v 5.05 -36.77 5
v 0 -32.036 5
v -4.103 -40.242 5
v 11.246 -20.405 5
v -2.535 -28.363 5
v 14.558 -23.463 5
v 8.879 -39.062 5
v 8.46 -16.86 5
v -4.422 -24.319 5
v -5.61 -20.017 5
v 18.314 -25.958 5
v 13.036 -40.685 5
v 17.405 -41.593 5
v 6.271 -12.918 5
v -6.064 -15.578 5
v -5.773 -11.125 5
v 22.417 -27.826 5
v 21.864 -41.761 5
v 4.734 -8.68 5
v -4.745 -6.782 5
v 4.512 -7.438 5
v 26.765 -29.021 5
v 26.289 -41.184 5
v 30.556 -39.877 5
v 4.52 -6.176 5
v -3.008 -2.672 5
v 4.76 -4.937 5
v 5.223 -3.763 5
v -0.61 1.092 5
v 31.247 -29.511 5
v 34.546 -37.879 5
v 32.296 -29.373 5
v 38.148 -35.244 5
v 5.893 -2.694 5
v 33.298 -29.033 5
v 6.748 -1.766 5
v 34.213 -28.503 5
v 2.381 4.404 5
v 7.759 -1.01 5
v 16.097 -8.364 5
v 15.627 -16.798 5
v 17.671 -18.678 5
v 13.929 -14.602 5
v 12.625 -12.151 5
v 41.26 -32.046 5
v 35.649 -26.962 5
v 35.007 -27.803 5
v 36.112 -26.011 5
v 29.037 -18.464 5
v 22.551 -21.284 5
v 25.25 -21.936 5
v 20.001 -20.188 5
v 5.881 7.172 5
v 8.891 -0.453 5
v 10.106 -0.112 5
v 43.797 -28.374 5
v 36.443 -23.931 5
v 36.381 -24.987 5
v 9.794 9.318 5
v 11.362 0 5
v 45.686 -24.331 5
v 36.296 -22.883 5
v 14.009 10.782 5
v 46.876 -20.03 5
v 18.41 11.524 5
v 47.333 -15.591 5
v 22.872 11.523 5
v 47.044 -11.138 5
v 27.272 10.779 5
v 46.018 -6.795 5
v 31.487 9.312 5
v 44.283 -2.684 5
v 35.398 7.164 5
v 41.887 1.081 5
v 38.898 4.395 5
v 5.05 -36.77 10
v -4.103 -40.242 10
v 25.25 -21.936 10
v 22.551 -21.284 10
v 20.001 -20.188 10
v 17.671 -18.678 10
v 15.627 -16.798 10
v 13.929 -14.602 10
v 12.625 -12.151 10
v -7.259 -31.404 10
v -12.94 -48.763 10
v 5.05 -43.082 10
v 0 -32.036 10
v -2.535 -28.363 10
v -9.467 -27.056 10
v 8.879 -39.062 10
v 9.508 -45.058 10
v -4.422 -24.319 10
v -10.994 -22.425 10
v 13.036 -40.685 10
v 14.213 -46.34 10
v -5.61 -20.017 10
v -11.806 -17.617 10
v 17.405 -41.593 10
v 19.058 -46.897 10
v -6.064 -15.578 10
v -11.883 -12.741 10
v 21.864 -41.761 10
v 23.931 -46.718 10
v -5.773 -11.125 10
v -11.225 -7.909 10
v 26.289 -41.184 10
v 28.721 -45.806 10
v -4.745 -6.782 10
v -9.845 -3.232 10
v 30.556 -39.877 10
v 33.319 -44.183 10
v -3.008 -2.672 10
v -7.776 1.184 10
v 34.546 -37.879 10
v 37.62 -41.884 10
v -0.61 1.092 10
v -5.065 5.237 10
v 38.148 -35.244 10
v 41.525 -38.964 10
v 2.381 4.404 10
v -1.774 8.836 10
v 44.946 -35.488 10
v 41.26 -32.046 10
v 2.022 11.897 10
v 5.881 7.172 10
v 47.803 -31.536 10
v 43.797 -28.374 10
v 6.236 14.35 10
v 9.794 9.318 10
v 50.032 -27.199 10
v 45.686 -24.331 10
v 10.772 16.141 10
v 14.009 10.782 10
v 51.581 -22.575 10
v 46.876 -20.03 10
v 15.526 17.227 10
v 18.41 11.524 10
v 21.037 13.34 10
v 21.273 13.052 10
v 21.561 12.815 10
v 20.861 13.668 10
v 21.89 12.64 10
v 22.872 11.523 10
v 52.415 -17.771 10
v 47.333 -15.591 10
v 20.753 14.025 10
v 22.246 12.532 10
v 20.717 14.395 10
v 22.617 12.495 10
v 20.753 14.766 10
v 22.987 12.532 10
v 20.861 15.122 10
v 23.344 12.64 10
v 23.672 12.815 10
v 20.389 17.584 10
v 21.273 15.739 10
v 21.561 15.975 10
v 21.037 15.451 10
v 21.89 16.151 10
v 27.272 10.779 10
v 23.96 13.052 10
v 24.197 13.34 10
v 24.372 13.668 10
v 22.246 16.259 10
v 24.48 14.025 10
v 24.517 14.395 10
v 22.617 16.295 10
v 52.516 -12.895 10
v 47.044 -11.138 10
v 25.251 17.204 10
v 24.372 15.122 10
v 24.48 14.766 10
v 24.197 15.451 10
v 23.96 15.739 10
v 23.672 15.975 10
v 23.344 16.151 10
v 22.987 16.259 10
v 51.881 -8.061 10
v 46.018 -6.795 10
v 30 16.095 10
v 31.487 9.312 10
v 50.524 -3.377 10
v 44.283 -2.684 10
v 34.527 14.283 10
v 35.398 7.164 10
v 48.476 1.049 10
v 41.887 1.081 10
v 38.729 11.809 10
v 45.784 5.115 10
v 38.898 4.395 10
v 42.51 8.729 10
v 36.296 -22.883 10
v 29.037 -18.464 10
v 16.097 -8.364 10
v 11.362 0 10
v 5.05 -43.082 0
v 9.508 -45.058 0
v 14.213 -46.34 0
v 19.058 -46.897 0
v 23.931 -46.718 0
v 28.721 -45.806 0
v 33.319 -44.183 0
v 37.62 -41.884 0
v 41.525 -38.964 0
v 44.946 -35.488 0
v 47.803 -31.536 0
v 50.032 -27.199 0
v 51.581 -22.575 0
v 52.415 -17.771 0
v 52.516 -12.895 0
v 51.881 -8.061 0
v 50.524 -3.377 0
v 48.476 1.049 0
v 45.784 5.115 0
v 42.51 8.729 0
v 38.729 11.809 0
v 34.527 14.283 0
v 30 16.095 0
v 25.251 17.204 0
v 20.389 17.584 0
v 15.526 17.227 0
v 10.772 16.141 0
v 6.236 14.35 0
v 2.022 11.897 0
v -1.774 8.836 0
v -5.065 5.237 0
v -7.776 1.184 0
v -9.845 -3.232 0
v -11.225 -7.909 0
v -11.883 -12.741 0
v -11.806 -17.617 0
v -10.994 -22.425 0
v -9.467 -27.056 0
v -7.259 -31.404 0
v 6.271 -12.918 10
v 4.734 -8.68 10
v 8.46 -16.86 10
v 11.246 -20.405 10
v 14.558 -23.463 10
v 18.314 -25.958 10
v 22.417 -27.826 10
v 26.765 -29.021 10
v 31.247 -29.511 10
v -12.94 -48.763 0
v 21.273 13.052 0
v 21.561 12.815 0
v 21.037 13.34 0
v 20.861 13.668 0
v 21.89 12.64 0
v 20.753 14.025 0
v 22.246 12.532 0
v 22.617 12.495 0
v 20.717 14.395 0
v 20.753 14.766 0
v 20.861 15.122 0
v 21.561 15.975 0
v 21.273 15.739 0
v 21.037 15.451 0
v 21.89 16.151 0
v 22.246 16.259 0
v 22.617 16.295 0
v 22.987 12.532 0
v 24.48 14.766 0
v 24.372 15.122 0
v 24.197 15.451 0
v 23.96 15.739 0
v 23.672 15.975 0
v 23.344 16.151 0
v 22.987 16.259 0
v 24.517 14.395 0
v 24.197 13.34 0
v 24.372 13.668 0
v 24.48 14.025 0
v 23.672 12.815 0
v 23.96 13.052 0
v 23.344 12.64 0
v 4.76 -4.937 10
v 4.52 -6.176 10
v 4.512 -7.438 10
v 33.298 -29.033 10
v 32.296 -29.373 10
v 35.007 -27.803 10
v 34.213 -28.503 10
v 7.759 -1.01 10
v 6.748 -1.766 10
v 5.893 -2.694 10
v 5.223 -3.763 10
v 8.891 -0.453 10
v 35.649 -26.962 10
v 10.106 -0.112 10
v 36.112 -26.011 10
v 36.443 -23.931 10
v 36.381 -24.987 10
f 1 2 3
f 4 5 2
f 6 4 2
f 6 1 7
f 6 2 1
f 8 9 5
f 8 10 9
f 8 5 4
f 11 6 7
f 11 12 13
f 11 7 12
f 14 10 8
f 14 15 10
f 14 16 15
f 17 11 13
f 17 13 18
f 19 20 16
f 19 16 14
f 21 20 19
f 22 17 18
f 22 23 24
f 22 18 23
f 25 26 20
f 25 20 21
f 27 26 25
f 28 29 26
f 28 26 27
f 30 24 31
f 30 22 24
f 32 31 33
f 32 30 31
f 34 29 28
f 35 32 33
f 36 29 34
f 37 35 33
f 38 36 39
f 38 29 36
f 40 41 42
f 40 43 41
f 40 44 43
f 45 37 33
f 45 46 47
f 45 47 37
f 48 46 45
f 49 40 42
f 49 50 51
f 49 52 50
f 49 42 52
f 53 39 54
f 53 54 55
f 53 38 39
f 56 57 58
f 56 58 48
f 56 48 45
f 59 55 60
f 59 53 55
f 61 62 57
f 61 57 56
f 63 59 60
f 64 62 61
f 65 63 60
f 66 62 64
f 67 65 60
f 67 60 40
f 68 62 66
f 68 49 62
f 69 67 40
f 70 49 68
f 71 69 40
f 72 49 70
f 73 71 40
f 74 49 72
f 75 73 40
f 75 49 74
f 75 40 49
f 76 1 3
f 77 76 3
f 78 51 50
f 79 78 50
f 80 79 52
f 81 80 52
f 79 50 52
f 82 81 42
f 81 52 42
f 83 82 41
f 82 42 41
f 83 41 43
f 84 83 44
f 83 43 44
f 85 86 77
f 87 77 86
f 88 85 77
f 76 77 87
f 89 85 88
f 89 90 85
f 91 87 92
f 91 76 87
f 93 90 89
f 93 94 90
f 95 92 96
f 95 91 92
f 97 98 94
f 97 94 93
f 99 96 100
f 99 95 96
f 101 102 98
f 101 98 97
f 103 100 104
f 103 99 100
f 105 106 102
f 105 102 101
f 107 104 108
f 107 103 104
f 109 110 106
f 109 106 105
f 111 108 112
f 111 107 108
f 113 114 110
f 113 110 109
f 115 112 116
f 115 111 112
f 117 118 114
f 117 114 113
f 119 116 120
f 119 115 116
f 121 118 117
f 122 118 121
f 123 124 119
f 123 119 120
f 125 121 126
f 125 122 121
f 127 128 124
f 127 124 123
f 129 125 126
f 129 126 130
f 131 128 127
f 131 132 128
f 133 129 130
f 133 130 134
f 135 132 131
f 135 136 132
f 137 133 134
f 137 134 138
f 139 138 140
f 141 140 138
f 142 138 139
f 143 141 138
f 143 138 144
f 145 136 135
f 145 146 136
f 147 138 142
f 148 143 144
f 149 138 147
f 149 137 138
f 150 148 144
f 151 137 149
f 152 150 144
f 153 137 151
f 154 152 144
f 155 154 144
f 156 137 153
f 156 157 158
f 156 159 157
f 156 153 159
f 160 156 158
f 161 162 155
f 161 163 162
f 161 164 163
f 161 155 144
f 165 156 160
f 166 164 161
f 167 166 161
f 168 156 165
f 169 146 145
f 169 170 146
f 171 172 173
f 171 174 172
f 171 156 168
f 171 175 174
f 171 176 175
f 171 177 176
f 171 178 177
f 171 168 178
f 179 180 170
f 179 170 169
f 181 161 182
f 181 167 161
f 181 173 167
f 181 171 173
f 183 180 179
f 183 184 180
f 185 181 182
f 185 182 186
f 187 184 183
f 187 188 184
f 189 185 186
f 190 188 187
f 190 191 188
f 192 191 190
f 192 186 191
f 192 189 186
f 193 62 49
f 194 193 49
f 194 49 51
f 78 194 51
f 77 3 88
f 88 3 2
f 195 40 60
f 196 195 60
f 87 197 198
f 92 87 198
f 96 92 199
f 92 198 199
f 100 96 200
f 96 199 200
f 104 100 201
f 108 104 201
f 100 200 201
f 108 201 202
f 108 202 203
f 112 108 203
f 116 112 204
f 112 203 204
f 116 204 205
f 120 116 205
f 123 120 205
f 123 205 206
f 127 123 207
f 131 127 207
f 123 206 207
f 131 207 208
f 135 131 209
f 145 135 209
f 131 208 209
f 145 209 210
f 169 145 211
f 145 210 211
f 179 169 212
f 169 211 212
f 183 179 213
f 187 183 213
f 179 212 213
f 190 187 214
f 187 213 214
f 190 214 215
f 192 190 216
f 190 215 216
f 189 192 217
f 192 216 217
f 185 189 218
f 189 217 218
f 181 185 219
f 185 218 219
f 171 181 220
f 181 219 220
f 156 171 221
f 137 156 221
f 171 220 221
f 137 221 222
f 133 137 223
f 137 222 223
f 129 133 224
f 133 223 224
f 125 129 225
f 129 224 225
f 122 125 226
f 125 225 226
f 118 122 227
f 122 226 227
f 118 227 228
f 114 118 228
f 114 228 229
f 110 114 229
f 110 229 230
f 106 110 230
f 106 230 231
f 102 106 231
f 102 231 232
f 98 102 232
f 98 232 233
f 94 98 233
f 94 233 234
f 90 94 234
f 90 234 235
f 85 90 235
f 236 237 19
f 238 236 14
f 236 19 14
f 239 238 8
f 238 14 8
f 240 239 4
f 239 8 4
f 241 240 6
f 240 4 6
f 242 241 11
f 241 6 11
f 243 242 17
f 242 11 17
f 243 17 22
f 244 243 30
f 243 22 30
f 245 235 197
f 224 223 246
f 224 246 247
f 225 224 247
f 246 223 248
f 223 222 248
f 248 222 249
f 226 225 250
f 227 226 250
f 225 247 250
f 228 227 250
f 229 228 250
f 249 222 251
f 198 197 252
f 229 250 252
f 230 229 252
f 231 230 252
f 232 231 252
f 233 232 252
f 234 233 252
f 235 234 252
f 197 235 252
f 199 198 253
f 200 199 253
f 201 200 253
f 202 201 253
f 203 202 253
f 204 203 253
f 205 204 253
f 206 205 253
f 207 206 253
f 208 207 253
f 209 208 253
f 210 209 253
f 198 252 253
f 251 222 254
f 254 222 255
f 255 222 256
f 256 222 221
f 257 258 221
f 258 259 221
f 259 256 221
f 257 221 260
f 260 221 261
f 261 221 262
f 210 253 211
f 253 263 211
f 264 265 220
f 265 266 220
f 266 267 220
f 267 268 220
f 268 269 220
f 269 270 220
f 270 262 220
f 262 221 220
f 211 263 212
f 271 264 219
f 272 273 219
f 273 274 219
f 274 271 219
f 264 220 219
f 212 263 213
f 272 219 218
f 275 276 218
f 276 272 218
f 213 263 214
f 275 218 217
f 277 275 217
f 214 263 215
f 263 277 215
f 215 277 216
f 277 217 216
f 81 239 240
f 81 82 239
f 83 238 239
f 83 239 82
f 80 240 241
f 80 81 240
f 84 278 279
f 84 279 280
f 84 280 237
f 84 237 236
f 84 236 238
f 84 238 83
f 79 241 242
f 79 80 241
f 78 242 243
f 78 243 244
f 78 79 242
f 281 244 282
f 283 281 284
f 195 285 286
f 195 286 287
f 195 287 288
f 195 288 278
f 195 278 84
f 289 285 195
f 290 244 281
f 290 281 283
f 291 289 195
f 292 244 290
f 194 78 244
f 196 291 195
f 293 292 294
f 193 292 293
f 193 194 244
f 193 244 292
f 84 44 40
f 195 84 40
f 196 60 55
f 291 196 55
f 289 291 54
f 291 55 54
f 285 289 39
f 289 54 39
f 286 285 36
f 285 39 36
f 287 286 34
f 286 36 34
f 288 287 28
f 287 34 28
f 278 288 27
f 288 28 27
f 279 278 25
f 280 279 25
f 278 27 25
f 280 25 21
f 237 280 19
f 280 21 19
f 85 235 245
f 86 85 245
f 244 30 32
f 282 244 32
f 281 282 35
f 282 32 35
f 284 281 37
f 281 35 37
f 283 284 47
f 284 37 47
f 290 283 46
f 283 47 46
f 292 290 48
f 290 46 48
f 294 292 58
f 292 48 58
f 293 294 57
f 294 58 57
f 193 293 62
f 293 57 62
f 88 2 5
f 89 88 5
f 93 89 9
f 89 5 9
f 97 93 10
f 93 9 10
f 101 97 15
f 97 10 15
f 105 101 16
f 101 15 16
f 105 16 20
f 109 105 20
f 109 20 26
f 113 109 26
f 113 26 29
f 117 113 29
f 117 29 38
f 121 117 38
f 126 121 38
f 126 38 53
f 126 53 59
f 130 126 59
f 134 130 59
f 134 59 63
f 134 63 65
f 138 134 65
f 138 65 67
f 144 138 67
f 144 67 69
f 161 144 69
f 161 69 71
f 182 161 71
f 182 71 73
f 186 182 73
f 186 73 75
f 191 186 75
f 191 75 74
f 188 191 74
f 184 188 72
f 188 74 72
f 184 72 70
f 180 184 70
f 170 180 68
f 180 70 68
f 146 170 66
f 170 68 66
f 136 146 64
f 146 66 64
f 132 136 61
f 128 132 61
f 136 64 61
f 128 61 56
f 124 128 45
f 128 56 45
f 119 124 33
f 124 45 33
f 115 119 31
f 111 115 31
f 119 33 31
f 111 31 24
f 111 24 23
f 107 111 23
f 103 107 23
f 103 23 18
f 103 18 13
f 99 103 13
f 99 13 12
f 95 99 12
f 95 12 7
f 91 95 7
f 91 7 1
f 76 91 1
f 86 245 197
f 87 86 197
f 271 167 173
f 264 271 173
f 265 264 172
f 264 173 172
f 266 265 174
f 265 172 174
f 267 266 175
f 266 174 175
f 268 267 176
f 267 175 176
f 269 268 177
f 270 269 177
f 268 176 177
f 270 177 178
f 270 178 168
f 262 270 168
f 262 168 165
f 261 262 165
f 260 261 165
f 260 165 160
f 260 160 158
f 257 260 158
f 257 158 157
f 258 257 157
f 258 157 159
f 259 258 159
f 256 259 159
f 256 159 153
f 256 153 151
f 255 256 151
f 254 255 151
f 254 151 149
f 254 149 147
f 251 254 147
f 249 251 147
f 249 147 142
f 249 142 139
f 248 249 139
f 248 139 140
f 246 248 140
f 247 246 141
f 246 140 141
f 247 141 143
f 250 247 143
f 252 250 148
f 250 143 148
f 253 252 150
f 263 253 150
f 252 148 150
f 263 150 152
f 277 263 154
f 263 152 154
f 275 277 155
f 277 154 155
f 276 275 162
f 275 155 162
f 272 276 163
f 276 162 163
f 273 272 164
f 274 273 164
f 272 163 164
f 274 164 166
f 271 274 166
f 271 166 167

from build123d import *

# Parameters (mm, degrees)
F1_DEPTH = 5
F2_DEPTH = 10
F3_R     = 1.9
F4_DEPTH = 25


with BuildPart() as f1:
    # F0 (on Top) → F1 (new body)
    with BuildSketch(Plane.XY):
        with BuildLine():
            Line((-12.9404729232, -48.7634912133), (5.0499415956, -43.0823117495))
            ThreePointArc((5.0499415956, -43.0823117495), (42.5104539856, 8.7293731877), (-7.2592892684, -31.4043201506))
            Line((-7.2592892684, -31.4043201506), (-12.9404729232, -48.7634912133))
        make_face()
        with BuildLine():
            ThreePointArc((0, -32.0355631411), (38.897729879, 4.3948998346), (5.0499415956, -36.7698818445))
            Line((5.0499415956, -36.7698818445), (-4.1030771099, -40.2417182922))
            Line((-4.1030771099, -40.2417182922), (0, -32.0355631411))
        make_face(mode=Mode.SUBTRACT)
        with BuildLine():
            Line((-4.1030771099, -40.2417182922), (5.0499415956, -36.7698818445))
            ThreePointArc((5.0499415956, -36.7698818445), (38.897729879, 4.3948998346), (0, -32.0355631411))
            Line((0, -32.0355631411), (-4.1030771099, -40.2417182922))
        make_face()
        with BuildLine():
            ThreePointArc((31.2465075403, -29.5105911791), (14.5582264722, -23.4633274209), (4.7343205661, -8.6795864627))
            ThreePointArc((4.7343205661, -8.6795864627), (5.8933290907, -2.69414639), (11.3623663783, 0))
            Line((11.3623663783, 0), (16.096688807, -8.3639649674))
            Line((16.096688807, -8.3639649674), (12.624851428, -12.1514201164))
            ThreePointArc((12.624851428, -12.1514201164), (17.6705032305, -18.6780973296), (25.2497028559, -21.9356808811))
            Line((25.2497028559, -21.9356808811), (29.0371589363, -18.4638462961))
            Line((29.0371589363, -18.4638462961), (36.2964533269, -22.8825435042))
            ThreePointArc((36.2964533269, -22.8825435042), (35.3488593131, -27.39838094), (31.2465075403, -29.5105911791))
        make_face(mode=Mode.SUBTRACT)
        with BuildLine():
            ThreePointArc((11.3623663783, 0), (5.8933290907, -2.69414639), (4.7343205661, -8.6795864627))
            ThreePointArc((4.7343205661, -8.6795864627), (14.5582264722, -23.4633274209), (31.2465075403, -29.5105911791))
            ThreePointArc((31.2465075403, -29.5105911791), (35.3488593131, -27.39838094), (36.2964533269, -22.8825435042))
            Line((36.2964533269, -22.8825435042), (29.0371589363, -18.4638462961))
            Line((29.0371589363, -18.4638462961), (25.2497028559, -21.9356808811))
            ThreePointArc((25.2497028559, -21.9356808811), (17.6705032305, -18.6780973296), (12.624851428, -12.1514201164))
            Line((12.624851428, -12.1514201164), (16.096688807, -8.3639649674))
            Line((16.096688807, -8.3639649674), (11.3623663783, 0))
        make_face()
    extrude(amount=F1_DEPTH)

    # F0 (on Top) → F2 (join)
    with BuildSketch(Plane.XY):
        with BuildLine():
            Line((-12.9404729232, -48.7634912133), (5.0499415956, -43.0823117495))
            ThreePointArc((5.0499415956, -43.0823117495), (42.5104539856, 8.7293731877), (-7.2592892684, -31.4043201506))
            Line((-7.2592892684, -31.4043201506), (-12.9404729232, -48.7634912133))
        make_face()
        with BuildLine():
            ThreePointArc((0, -32.0355631411), (38.897729879, 4.3948998346), (5.0499415956, -36.7698818445))
            Line((5.0499415956, -36.7698818445), (-4.1030771099, -40.2417182922))
            Line((-4.1030771099, -40.2417182922), (0, -32.0355631411))
        make_face(mode=Mode.SUBTRACT)
        with BuildLine():
            ThreePointArc((11.3623663783, 0), (5.8933290907, -2.69414639), (4.7343205661, -8.6795864627))
            ThreePointArc((4.7343205661, -8.6795864627), (14.5582264722, -23.4633274209), (31.2465075403, -29.5105911791))
            ThreePointArc((31.2465075403, -29.5105911791), (35.3488593131, -27.39838094), (36.2964533269, -22.8825435042))
            Line((36.2964533269, -22.8825435042), (29.0371589363, -18.4638462961))
            Line((29.0371589363, -18.4638462961), (25.2497028559, -21.9356808811))
            ThreePointArc((25.2497028559, -21.9356808811), (17.6705032305, -18.6780973296), (12.624851428, -12.1514201164))
            Line((12.624851428, -12.1514201164), (16.096688807, -8.3639649674))
            Line((16.096688807, -8.3639649674), (11.3623663783, 0))
        make_face()
    extrude(amount=F2_DEPTH)

    # F3 (on face) → F4 (cut)
    with BuildSketch(Plane.XY.offset(10)):
        with Locations((22.6168166846, 14.3952518702)):
            Circle(F3_R)
    extrude(amount=-F4_DEPTH, mode=Mode.SUBTRACT)


solid = f1.part
